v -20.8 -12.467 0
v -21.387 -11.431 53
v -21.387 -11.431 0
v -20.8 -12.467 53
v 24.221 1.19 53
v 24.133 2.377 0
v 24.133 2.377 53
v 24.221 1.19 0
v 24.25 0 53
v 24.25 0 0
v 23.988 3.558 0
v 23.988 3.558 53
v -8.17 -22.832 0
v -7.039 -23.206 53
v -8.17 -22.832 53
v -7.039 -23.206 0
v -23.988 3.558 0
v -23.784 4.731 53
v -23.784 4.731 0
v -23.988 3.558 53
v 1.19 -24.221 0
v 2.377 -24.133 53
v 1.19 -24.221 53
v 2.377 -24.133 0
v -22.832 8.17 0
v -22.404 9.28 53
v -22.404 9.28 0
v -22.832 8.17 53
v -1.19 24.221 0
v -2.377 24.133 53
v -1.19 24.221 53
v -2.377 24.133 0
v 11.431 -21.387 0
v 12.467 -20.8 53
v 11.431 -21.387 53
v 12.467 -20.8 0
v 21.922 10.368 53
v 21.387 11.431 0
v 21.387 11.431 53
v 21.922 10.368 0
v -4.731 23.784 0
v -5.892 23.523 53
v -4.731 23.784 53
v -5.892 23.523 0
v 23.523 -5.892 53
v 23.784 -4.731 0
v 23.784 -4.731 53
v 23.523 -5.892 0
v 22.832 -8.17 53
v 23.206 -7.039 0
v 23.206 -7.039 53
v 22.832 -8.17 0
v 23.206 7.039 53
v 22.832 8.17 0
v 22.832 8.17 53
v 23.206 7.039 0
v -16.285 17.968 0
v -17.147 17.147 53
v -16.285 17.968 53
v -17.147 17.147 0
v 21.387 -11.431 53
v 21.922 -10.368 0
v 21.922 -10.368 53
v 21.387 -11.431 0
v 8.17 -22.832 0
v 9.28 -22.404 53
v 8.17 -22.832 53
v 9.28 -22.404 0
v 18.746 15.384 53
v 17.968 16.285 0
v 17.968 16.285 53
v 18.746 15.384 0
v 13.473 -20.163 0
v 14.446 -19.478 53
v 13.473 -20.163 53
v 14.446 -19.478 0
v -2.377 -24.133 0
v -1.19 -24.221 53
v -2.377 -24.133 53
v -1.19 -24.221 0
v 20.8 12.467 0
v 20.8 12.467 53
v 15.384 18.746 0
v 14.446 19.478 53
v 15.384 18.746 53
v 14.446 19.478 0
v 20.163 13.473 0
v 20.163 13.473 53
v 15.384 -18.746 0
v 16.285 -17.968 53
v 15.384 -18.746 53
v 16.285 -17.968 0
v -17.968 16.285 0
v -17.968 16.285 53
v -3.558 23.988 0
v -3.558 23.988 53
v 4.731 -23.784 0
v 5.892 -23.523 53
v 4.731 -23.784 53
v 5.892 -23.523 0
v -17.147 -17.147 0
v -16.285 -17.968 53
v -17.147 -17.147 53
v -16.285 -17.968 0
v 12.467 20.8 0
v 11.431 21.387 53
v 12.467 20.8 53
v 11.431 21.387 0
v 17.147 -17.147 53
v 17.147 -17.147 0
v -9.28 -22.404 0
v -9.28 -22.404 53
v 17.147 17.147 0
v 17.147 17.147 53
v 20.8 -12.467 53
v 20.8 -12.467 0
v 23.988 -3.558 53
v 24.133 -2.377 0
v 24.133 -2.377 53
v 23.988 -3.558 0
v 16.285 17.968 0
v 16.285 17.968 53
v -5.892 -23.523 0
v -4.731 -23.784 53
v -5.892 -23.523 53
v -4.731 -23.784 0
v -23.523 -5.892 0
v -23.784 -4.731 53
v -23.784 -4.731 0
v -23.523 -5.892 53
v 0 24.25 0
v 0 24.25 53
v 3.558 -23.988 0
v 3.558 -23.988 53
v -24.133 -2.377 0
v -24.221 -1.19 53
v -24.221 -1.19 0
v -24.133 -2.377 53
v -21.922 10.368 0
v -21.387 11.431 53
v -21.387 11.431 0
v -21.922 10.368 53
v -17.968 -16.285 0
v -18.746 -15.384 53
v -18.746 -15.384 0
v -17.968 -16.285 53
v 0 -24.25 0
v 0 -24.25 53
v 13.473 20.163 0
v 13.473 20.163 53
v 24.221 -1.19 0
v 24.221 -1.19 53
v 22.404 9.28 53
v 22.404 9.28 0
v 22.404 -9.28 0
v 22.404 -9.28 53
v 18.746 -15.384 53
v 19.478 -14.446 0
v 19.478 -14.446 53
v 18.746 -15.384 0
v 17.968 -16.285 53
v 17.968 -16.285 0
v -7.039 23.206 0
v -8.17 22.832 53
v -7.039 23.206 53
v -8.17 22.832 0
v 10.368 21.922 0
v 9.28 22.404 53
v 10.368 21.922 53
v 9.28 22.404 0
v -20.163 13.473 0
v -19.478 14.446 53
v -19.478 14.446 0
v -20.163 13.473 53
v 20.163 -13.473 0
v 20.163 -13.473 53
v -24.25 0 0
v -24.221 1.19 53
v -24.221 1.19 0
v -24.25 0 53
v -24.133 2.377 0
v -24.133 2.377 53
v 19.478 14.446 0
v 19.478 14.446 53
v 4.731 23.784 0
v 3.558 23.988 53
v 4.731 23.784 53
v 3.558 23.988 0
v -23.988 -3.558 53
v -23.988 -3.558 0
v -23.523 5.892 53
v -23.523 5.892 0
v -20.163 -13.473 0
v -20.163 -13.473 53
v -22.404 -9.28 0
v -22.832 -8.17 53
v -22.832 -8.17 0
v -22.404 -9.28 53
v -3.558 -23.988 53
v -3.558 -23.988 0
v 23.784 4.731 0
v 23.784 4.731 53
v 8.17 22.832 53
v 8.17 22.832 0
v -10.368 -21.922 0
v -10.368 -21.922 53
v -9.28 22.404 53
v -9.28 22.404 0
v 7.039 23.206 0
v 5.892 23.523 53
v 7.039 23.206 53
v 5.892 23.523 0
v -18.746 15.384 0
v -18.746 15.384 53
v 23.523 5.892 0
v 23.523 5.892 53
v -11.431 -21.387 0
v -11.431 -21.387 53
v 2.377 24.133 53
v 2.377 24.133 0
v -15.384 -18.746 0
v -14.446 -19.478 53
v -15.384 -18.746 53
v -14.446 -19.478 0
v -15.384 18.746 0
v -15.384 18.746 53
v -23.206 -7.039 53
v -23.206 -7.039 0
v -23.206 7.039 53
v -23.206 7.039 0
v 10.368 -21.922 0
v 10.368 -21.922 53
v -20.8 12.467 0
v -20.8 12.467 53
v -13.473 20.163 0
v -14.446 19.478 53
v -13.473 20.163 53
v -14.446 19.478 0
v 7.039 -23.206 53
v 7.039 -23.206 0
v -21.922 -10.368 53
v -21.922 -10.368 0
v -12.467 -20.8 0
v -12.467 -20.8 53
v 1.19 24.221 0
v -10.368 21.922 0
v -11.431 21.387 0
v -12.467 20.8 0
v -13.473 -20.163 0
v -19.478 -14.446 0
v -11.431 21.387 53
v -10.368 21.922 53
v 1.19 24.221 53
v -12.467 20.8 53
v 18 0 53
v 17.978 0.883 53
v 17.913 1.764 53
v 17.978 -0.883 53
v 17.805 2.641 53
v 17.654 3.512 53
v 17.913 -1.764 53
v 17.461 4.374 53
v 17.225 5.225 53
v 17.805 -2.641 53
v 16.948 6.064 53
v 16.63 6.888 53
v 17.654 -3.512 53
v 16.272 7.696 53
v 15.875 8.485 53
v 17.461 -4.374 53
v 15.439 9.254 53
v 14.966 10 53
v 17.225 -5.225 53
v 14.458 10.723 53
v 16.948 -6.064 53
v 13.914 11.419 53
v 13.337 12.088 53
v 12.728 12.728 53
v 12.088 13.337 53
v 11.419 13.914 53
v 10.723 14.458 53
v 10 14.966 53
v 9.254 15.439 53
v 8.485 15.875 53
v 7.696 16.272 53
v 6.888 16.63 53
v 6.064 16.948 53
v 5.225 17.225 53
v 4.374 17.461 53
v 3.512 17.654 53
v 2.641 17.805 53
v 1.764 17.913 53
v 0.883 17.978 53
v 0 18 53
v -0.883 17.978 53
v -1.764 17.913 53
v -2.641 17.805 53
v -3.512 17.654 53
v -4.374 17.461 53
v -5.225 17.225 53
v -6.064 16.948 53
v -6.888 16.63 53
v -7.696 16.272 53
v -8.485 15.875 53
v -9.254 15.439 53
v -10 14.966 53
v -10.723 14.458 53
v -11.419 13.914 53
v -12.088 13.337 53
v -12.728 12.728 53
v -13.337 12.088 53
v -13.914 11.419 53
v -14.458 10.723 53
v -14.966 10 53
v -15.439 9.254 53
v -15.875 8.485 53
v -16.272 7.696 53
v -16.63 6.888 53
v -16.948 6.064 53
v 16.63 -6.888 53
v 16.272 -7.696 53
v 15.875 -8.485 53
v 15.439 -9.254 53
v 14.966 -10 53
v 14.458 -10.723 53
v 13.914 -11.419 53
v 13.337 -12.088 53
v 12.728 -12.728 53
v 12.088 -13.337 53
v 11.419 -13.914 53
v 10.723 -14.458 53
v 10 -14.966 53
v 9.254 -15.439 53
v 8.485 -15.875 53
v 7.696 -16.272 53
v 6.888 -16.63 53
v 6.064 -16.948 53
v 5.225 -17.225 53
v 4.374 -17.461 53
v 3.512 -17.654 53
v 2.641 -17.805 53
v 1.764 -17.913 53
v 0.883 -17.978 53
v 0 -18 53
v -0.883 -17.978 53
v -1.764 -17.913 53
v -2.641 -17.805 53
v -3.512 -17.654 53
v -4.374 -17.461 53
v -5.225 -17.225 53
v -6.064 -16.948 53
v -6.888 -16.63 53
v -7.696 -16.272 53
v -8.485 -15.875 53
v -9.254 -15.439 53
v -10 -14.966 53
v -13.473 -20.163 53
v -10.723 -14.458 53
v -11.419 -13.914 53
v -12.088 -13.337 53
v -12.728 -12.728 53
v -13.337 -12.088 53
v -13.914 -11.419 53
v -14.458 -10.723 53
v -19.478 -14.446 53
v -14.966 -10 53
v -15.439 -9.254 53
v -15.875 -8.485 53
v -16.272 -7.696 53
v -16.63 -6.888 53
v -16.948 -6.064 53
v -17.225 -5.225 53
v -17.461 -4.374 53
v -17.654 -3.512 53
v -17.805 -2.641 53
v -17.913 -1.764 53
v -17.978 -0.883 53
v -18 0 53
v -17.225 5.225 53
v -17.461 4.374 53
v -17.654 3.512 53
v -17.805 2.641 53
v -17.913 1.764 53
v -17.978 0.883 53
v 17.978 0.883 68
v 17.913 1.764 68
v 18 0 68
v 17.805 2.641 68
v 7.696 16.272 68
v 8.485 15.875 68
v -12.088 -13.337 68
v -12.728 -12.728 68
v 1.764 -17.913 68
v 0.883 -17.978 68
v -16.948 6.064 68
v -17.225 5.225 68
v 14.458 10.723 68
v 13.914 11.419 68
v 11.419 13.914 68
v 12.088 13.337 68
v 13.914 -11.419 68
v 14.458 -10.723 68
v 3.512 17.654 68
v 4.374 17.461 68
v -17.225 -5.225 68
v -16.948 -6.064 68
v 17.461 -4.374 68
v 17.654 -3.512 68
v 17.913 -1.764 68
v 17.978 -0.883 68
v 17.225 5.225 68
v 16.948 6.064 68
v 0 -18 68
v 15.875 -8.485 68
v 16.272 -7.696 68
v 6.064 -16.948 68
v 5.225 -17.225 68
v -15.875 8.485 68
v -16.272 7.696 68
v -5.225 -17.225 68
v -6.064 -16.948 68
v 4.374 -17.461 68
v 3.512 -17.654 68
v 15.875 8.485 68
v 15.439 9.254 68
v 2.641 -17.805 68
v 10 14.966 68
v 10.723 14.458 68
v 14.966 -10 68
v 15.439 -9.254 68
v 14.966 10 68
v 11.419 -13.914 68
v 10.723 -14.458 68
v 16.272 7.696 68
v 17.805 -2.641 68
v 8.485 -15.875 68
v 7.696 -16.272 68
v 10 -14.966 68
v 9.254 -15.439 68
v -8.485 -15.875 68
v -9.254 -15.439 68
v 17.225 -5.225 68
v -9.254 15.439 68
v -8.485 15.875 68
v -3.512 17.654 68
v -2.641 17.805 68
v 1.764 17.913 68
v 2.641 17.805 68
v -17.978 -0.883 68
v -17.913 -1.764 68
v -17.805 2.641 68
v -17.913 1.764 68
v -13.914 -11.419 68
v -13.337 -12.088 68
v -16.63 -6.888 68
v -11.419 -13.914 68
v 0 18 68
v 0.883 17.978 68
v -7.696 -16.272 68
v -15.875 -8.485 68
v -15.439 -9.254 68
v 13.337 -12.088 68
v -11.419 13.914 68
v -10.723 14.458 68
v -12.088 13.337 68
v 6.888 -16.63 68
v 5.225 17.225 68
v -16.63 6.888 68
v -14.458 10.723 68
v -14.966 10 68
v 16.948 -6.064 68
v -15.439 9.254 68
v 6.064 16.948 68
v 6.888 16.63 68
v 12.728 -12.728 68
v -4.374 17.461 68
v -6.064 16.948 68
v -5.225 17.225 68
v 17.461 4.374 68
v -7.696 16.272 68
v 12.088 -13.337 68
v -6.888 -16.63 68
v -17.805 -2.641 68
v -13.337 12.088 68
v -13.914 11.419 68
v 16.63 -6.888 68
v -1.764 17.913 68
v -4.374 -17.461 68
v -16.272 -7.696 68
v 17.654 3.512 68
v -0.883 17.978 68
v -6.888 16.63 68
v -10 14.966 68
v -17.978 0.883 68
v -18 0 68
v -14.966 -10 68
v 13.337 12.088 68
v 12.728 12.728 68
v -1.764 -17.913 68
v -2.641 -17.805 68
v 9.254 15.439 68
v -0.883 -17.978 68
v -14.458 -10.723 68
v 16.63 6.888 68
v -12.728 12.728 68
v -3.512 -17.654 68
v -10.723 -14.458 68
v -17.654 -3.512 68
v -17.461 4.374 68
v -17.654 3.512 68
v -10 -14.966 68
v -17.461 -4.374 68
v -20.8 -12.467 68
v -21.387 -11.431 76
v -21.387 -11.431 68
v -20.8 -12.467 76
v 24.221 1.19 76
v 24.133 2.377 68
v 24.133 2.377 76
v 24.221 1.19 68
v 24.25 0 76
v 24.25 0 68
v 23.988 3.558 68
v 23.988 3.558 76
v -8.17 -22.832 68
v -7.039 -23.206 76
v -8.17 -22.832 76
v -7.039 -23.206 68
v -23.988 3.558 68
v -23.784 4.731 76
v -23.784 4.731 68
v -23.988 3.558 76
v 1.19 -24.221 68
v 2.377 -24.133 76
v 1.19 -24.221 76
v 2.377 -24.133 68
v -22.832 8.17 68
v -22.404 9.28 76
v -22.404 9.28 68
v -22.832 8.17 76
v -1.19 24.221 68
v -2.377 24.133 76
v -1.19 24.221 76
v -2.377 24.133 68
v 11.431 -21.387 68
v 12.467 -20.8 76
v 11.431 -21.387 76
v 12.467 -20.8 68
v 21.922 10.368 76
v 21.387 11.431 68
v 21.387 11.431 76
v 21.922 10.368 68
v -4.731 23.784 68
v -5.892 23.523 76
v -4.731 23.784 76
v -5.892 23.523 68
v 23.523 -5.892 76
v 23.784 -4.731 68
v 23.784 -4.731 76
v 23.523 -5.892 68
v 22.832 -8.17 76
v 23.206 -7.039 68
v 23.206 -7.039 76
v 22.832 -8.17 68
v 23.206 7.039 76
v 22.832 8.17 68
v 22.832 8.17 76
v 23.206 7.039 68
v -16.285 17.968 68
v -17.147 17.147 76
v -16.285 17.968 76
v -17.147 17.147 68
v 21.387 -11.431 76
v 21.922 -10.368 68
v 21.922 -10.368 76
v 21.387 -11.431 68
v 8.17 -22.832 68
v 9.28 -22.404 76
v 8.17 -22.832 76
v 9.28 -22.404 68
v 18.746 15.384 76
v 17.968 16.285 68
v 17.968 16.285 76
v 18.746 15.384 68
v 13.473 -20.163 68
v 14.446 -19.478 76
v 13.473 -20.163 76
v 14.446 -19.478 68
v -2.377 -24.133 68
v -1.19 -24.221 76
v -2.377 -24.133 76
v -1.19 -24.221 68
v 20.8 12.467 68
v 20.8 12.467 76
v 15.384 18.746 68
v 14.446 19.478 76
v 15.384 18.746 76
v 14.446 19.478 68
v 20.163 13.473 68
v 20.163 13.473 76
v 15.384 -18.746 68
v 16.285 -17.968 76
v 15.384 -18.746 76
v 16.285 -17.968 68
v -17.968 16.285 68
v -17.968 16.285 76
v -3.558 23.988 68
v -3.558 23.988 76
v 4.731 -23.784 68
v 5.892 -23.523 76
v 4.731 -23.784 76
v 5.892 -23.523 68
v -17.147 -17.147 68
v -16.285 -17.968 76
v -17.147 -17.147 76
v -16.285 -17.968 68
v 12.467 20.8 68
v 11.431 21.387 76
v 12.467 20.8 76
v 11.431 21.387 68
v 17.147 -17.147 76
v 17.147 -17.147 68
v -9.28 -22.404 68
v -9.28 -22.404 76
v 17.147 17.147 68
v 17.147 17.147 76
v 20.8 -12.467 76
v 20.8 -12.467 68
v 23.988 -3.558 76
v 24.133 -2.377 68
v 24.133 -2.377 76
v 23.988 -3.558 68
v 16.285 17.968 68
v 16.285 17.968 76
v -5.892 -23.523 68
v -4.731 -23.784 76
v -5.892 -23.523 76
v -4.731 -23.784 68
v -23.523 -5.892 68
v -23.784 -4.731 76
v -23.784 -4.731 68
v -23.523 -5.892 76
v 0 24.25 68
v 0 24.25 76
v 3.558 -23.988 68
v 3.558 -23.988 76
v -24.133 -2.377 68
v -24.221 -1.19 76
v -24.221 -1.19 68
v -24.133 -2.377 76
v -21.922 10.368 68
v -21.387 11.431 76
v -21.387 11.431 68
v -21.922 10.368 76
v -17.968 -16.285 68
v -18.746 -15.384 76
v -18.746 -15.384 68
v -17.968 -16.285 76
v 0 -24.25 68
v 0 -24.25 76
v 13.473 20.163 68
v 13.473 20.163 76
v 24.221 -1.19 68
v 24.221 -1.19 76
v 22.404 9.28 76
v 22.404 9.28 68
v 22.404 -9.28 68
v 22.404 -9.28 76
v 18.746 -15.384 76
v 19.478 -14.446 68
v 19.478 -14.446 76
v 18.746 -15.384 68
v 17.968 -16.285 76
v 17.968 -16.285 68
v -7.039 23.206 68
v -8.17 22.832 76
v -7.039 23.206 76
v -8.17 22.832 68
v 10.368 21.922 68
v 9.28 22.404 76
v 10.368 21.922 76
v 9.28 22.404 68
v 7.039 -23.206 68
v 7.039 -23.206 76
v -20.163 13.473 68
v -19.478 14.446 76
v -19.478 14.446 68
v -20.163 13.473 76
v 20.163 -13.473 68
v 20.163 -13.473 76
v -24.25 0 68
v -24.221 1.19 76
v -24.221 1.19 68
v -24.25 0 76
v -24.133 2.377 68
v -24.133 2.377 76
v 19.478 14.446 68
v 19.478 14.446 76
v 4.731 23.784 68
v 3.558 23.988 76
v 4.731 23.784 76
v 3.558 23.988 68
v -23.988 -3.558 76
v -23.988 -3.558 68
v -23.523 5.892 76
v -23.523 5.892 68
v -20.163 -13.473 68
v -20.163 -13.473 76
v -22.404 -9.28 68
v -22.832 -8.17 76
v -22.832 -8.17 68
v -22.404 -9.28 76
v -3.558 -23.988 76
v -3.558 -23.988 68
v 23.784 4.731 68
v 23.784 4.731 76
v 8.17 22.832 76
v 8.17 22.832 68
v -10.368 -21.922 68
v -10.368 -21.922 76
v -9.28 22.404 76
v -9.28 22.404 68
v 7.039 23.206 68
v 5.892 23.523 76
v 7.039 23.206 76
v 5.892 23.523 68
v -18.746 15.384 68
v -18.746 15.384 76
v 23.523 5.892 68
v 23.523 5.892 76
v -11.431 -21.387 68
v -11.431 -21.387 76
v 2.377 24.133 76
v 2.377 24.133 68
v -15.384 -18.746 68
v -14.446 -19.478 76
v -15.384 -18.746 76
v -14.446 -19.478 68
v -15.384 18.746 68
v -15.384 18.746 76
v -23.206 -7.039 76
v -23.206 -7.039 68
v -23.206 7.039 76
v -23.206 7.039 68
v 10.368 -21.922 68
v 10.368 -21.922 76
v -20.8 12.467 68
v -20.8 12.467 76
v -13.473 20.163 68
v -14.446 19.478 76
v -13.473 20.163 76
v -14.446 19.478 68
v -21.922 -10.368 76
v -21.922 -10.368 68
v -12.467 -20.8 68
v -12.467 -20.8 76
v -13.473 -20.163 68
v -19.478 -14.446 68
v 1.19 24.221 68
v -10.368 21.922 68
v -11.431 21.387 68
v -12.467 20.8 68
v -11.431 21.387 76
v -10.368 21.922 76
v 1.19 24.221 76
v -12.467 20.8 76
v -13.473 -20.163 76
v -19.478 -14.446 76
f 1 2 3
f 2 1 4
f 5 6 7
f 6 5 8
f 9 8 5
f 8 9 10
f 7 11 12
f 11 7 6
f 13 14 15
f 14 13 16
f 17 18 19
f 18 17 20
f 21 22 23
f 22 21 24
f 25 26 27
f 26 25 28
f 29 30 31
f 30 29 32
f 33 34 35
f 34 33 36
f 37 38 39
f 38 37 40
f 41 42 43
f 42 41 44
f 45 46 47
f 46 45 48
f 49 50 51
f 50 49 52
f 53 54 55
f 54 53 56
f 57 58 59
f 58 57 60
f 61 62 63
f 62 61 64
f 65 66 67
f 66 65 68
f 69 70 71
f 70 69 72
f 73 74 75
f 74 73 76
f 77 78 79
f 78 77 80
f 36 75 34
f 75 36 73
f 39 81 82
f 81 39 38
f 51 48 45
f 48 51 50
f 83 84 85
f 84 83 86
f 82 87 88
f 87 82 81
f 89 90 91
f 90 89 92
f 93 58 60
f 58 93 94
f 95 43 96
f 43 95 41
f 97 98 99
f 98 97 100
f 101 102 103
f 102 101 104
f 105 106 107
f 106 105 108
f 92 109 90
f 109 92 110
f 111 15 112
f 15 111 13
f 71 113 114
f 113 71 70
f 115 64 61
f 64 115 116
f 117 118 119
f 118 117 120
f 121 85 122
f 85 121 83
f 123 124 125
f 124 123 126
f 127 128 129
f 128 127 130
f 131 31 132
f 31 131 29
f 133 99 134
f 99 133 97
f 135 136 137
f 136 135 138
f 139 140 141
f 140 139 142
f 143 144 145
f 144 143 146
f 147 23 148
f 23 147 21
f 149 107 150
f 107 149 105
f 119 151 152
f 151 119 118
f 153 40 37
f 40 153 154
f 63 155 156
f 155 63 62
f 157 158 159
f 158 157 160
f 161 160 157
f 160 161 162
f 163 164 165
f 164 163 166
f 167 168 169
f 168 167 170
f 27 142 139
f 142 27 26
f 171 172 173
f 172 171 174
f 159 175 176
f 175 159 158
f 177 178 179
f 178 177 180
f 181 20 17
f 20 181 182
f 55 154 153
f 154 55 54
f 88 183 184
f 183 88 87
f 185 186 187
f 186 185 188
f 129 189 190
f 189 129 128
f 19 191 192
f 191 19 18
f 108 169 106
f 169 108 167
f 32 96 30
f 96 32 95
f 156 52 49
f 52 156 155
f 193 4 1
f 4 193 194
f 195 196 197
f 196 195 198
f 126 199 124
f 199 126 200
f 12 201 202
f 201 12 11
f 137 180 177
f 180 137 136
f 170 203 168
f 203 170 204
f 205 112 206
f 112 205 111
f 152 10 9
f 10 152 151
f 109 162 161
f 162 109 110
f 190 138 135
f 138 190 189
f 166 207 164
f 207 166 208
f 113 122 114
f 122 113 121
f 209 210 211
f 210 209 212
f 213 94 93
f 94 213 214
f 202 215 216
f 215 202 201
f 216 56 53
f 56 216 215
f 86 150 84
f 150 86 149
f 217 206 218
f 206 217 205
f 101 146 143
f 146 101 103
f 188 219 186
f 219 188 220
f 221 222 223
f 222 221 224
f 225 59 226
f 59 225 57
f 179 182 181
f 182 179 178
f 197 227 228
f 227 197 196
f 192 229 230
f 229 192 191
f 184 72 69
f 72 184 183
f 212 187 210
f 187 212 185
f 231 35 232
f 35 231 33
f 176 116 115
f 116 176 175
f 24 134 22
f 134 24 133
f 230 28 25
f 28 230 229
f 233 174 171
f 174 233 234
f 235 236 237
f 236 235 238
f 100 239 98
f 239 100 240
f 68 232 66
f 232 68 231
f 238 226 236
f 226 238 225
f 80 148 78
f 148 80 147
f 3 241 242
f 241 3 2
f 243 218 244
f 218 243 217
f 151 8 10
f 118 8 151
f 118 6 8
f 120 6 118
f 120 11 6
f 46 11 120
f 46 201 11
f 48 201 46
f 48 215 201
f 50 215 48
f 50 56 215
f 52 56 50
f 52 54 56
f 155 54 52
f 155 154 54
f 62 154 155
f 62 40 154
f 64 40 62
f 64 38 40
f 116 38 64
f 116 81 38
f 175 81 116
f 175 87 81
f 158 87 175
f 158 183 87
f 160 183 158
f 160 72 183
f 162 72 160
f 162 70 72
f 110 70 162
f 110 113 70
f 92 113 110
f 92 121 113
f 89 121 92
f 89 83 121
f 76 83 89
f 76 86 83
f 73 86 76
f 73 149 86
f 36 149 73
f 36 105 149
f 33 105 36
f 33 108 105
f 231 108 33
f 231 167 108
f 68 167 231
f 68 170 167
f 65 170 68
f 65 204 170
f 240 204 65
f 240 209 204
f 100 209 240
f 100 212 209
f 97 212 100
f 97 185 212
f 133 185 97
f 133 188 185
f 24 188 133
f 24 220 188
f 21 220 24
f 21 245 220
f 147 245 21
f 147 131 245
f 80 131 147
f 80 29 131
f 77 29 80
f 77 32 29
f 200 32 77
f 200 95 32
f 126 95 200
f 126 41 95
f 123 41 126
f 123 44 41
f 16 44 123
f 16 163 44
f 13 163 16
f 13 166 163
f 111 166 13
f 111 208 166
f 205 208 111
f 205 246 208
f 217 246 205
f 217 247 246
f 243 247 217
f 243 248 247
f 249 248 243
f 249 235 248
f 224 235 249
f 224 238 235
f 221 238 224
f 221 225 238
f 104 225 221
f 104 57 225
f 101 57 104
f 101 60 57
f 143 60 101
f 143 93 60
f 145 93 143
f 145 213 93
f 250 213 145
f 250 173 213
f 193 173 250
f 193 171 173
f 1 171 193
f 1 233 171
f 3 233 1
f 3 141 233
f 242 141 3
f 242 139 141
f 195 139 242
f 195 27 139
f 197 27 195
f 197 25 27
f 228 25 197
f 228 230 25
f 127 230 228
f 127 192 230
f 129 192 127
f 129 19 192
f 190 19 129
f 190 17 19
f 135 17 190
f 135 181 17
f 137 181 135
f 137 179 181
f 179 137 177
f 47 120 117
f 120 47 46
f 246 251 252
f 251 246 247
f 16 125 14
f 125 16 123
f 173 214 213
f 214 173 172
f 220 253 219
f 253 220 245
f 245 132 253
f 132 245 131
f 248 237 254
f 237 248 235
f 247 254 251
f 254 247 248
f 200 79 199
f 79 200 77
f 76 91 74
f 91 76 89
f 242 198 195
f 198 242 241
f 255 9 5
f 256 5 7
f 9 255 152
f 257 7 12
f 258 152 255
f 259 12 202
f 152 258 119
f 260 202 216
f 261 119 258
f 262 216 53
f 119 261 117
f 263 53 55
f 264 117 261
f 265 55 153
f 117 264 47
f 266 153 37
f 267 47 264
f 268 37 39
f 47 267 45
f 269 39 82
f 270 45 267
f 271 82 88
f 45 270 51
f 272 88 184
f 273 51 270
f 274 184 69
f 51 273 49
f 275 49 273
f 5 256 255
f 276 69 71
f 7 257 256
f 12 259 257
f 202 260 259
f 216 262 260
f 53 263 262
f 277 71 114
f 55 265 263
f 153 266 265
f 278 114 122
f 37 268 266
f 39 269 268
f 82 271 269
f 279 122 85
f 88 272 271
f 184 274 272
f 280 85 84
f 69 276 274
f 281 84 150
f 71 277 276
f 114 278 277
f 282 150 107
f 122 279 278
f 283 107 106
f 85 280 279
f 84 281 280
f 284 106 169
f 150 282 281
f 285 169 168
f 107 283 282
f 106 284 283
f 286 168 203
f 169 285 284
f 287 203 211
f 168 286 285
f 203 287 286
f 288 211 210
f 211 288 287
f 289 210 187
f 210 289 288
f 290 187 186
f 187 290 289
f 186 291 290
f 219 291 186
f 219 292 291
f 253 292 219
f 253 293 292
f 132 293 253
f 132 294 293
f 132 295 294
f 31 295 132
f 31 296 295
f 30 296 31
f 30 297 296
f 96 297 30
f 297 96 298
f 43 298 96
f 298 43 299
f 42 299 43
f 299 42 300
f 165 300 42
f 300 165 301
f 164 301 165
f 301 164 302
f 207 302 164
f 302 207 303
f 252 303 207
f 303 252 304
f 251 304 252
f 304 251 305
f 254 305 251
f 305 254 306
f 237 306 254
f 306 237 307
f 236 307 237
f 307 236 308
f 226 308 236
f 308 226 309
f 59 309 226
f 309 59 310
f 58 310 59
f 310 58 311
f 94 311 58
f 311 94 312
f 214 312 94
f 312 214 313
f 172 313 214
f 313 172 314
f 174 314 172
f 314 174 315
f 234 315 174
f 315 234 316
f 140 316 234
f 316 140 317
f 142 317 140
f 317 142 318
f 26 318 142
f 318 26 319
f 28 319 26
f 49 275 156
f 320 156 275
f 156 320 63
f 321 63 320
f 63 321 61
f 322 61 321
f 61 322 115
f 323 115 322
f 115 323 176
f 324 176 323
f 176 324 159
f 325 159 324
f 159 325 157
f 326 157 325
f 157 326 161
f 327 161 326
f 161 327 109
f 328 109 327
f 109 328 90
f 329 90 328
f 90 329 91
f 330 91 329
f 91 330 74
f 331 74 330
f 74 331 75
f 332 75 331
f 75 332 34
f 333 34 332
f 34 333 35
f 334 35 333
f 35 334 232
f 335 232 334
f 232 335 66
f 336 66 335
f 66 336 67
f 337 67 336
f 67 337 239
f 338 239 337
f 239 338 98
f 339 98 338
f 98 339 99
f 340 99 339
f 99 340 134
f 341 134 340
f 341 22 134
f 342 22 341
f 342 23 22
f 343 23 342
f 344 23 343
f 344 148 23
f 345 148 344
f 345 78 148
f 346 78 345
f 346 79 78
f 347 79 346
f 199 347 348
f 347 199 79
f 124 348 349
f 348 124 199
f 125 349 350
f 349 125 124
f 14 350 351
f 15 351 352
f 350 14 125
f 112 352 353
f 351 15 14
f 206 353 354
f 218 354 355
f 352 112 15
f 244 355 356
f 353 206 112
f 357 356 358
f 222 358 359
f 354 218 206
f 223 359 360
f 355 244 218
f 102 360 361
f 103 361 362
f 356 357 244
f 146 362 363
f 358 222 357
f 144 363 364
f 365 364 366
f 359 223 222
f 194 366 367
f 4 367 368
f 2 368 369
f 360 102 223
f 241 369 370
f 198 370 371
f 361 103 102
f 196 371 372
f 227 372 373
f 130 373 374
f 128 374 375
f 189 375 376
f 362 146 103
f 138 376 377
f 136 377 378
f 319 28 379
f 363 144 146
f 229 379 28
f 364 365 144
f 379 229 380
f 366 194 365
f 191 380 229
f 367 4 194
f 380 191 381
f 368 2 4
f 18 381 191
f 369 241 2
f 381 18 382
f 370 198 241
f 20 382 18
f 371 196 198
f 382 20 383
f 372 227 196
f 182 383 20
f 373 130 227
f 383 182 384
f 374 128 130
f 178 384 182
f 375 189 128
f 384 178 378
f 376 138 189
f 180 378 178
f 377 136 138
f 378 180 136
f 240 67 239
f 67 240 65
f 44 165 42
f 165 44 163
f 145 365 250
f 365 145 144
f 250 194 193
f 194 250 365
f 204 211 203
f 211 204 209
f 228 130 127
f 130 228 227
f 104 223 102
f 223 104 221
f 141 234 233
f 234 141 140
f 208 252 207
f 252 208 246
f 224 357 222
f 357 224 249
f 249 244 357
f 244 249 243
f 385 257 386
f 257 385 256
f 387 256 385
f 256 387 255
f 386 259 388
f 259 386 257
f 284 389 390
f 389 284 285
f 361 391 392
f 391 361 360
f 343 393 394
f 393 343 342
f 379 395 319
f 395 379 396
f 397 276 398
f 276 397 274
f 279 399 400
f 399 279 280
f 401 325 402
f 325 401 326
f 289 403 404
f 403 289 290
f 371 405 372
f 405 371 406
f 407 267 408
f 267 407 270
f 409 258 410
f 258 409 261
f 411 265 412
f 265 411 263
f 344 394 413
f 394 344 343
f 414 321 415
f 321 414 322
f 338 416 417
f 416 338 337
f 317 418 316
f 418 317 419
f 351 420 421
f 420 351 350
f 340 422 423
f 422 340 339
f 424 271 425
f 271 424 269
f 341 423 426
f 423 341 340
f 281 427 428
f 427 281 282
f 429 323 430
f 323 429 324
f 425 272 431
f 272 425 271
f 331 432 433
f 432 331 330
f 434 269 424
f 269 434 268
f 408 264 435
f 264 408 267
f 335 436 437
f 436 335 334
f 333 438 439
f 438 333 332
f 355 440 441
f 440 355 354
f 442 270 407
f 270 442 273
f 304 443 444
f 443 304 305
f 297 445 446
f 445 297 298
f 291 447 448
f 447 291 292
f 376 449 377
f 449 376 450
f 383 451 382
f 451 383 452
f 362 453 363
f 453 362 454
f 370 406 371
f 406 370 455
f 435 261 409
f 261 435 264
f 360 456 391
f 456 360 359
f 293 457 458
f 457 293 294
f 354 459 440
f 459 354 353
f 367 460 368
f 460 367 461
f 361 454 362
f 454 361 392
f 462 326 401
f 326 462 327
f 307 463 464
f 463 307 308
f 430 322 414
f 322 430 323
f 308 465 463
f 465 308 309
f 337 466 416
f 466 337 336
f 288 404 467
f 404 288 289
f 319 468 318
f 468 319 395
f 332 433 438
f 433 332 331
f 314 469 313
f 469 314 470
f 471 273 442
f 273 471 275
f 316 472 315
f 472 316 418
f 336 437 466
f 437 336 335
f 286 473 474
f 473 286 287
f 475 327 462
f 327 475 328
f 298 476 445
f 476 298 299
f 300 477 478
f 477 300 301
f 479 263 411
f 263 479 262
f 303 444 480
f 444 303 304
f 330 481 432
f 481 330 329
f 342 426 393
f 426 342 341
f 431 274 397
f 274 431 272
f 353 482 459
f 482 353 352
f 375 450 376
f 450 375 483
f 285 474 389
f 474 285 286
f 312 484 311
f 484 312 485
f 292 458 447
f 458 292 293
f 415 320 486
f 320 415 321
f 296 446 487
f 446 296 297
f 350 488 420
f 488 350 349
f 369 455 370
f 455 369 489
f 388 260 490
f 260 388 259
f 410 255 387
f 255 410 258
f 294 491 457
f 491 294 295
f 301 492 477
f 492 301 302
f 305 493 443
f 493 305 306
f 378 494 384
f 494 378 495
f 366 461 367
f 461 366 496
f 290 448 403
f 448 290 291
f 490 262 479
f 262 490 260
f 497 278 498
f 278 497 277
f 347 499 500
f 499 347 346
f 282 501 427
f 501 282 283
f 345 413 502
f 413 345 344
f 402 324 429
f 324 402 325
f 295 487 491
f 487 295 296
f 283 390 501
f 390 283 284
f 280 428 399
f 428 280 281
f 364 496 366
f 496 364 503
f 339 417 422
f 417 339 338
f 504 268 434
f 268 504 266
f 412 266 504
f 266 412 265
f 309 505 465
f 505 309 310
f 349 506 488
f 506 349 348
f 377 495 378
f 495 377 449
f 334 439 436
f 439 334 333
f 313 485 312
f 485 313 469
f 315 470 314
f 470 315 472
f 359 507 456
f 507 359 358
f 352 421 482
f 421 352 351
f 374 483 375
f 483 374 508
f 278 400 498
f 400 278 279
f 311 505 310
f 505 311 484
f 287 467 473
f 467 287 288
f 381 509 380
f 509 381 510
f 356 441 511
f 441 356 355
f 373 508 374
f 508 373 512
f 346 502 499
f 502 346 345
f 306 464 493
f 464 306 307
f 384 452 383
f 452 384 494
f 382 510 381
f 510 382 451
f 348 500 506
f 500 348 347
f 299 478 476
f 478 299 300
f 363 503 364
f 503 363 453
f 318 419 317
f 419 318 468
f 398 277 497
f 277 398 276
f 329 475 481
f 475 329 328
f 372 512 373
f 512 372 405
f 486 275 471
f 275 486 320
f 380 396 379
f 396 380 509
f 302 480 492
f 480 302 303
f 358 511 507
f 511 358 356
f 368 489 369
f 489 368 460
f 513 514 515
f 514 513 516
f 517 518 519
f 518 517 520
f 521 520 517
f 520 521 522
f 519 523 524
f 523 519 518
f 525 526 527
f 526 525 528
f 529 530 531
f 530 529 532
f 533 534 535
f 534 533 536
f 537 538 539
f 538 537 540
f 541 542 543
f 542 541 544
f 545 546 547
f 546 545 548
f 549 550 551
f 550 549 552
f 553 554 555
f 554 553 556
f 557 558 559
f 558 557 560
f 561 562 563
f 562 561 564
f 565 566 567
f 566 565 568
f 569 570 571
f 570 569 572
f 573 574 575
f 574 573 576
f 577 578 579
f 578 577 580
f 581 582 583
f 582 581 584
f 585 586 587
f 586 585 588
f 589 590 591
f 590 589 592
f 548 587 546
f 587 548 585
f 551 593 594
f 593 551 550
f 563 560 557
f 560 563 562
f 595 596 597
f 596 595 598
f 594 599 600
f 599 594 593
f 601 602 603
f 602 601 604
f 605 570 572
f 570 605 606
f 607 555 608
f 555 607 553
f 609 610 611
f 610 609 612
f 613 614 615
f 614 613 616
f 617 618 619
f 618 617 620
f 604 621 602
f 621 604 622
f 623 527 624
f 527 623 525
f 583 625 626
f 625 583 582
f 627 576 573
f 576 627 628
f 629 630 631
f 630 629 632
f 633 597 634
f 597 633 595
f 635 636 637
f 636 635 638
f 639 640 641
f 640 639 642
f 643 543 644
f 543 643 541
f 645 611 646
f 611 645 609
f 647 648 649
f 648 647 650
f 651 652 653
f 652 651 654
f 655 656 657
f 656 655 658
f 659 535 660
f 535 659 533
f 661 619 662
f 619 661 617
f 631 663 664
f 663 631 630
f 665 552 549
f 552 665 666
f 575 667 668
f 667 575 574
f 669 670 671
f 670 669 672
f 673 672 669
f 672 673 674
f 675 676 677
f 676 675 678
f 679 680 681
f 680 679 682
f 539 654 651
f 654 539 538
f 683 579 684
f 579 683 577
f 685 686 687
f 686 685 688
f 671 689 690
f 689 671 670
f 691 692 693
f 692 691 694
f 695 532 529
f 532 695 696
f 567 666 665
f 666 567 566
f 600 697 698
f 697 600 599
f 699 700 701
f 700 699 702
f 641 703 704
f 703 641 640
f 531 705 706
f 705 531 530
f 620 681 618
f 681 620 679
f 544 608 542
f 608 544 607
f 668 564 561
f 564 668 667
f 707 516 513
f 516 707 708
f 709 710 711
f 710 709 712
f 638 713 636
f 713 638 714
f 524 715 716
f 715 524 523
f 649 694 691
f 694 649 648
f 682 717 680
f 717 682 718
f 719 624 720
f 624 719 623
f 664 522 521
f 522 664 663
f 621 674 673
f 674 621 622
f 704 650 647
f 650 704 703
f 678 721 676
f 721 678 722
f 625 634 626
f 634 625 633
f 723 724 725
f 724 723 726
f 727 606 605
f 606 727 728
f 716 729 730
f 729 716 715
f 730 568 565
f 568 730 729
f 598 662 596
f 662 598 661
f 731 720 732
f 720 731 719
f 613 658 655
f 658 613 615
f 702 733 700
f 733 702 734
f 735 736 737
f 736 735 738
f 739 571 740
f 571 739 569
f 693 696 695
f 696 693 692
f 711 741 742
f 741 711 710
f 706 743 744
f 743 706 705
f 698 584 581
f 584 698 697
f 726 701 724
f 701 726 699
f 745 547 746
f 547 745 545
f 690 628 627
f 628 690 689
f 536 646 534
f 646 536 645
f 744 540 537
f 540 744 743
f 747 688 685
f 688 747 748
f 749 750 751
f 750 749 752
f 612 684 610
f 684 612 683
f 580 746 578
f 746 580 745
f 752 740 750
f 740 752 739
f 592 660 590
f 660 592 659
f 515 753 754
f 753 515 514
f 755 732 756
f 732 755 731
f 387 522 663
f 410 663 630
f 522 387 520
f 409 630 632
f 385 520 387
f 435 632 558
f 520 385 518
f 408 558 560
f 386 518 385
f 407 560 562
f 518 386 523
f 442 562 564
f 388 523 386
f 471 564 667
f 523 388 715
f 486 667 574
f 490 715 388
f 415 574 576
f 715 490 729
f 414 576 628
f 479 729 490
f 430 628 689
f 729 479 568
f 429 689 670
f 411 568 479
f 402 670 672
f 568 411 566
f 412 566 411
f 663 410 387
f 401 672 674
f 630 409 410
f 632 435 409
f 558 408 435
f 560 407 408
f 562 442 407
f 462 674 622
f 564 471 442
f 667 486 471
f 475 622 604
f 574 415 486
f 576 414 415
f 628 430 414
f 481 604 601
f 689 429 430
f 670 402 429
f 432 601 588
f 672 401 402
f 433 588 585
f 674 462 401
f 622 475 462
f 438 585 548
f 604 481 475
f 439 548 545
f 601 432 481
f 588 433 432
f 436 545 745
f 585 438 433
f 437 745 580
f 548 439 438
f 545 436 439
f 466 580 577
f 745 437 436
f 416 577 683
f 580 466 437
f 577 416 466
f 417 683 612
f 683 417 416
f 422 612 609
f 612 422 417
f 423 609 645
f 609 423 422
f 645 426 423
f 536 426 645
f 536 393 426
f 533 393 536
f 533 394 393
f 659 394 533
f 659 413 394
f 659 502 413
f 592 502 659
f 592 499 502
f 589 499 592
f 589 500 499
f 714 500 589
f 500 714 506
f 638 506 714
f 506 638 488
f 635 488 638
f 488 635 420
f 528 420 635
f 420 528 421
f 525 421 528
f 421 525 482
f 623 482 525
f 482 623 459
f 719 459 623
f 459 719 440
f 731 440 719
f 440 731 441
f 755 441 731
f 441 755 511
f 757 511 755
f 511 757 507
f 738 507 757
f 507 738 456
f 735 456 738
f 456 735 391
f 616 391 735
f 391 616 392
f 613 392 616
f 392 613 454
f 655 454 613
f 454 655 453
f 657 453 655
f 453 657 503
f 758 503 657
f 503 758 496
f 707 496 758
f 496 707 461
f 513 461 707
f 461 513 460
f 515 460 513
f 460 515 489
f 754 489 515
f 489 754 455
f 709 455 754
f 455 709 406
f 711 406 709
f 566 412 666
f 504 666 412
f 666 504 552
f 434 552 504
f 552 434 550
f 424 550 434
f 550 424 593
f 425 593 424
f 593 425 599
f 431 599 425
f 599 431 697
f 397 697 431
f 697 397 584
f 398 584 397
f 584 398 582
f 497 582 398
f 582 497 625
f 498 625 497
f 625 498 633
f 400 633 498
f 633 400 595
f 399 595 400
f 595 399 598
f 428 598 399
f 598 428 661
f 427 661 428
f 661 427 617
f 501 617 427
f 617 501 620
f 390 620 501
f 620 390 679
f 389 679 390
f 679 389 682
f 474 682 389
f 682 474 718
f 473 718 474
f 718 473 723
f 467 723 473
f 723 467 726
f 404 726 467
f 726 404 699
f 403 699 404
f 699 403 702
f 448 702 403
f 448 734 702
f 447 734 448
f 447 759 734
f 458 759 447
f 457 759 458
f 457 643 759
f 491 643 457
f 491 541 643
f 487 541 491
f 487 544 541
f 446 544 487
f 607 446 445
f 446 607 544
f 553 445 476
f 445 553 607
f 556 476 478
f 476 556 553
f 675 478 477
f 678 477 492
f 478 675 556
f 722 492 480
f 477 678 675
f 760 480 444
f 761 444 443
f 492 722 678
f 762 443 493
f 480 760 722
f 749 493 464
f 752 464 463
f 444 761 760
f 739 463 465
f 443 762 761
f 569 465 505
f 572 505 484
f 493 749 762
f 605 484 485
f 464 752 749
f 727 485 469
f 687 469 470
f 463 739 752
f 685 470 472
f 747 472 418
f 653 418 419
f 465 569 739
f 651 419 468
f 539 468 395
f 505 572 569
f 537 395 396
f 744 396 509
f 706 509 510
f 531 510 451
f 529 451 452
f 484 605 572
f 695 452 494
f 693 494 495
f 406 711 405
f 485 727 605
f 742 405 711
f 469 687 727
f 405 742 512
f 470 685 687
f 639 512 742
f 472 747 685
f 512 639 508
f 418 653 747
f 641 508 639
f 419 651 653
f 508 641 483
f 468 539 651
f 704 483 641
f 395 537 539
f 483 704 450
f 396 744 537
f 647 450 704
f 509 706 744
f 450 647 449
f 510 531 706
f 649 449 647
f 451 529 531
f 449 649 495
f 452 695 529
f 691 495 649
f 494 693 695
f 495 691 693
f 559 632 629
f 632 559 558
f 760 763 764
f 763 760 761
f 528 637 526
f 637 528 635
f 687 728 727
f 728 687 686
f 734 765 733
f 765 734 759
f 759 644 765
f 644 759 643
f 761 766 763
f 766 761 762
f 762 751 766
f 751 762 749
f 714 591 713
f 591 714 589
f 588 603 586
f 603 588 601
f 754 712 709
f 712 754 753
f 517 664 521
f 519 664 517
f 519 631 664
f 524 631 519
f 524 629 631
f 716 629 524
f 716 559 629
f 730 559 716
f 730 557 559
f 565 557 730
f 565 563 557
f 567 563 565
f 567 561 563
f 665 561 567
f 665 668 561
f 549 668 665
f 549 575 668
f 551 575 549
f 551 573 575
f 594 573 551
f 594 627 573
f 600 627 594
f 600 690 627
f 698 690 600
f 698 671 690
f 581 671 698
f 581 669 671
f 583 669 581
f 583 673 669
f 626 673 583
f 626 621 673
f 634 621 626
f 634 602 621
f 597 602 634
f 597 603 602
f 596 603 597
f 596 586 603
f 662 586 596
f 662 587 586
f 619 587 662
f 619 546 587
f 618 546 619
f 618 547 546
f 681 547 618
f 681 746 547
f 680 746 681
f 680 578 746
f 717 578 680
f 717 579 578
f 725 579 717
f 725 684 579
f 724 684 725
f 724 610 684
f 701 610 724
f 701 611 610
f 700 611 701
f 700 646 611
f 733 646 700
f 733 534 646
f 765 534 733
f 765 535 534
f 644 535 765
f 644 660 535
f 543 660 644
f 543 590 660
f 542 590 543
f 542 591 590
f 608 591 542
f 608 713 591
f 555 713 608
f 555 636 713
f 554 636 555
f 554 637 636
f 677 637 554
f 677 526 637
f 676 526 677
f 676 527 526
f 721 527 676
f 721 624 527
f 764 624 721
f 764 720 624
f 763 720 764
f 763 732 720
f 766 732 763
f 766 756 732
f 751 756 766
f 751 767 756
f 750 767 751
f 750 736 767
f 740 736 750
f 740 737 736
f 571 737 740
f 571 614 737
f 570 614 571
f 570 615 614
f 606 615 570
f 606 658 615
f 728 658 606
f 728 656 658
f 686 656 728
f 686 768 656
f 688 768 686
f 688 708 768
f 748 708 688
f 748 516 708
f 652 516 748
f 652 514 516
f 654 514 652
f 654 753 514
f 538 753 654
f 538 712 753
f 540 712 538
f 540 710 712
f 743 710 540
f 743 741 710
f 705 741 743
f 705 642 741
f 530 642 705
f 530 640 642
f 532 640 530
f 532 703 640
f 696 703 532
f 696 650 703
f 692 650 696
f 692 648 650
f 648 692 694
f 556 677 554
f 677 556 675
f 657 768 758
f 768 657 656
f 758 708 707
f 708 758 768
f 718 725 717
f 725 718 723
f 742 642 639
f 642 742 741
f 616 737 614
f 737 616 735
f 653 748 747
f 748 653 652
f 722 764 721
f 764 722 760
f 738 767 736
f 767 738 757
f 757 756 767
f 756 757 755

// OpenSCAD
// Owned ballast C, 1000 g per item (user statement).
// Reference CAD only. Axis Z; origin at centre of bottom face.
/* [Dimensions read from IMG_4269 (mm)] */
body_d = 48.5;
body_height = 53;
total_height = 76;
neck_d = 36;
// Head diameter equals body diameter (confirmed by user).
/* [Provisional head height - not given in photo] */
head_height_provisional = 8;
/* [Hidden] */
$fn = 128;
epsilon = 0.01;

// Sharp shoulders approximate the undimensioned rounded transitions.
module ballast_c(body_d, body_height, total_height, neck_d, head_d, head_height) {
    neck_height = total_height-body_height-head_height;
    assert(body_d > 0 && body_height > 0 && neck_d > 0);
    assert(head_height > 0 && neck_height > 0 && neck_d < body_d && head_d > neck_d);
    union() {
        cylinder(d=body_d, h=body_height);
        translate([0,0,body_height-epsilon])
            cylinder(d=neck_d, h=neck_height+2*epsilon);
        translate([0,0,total_height-head_height])
            cylinder(d=head_d, h=head_height);
    }
}
ballast_c(body_d, body_height, total_height, neck_d,
          body_d, head_height_provisional);
